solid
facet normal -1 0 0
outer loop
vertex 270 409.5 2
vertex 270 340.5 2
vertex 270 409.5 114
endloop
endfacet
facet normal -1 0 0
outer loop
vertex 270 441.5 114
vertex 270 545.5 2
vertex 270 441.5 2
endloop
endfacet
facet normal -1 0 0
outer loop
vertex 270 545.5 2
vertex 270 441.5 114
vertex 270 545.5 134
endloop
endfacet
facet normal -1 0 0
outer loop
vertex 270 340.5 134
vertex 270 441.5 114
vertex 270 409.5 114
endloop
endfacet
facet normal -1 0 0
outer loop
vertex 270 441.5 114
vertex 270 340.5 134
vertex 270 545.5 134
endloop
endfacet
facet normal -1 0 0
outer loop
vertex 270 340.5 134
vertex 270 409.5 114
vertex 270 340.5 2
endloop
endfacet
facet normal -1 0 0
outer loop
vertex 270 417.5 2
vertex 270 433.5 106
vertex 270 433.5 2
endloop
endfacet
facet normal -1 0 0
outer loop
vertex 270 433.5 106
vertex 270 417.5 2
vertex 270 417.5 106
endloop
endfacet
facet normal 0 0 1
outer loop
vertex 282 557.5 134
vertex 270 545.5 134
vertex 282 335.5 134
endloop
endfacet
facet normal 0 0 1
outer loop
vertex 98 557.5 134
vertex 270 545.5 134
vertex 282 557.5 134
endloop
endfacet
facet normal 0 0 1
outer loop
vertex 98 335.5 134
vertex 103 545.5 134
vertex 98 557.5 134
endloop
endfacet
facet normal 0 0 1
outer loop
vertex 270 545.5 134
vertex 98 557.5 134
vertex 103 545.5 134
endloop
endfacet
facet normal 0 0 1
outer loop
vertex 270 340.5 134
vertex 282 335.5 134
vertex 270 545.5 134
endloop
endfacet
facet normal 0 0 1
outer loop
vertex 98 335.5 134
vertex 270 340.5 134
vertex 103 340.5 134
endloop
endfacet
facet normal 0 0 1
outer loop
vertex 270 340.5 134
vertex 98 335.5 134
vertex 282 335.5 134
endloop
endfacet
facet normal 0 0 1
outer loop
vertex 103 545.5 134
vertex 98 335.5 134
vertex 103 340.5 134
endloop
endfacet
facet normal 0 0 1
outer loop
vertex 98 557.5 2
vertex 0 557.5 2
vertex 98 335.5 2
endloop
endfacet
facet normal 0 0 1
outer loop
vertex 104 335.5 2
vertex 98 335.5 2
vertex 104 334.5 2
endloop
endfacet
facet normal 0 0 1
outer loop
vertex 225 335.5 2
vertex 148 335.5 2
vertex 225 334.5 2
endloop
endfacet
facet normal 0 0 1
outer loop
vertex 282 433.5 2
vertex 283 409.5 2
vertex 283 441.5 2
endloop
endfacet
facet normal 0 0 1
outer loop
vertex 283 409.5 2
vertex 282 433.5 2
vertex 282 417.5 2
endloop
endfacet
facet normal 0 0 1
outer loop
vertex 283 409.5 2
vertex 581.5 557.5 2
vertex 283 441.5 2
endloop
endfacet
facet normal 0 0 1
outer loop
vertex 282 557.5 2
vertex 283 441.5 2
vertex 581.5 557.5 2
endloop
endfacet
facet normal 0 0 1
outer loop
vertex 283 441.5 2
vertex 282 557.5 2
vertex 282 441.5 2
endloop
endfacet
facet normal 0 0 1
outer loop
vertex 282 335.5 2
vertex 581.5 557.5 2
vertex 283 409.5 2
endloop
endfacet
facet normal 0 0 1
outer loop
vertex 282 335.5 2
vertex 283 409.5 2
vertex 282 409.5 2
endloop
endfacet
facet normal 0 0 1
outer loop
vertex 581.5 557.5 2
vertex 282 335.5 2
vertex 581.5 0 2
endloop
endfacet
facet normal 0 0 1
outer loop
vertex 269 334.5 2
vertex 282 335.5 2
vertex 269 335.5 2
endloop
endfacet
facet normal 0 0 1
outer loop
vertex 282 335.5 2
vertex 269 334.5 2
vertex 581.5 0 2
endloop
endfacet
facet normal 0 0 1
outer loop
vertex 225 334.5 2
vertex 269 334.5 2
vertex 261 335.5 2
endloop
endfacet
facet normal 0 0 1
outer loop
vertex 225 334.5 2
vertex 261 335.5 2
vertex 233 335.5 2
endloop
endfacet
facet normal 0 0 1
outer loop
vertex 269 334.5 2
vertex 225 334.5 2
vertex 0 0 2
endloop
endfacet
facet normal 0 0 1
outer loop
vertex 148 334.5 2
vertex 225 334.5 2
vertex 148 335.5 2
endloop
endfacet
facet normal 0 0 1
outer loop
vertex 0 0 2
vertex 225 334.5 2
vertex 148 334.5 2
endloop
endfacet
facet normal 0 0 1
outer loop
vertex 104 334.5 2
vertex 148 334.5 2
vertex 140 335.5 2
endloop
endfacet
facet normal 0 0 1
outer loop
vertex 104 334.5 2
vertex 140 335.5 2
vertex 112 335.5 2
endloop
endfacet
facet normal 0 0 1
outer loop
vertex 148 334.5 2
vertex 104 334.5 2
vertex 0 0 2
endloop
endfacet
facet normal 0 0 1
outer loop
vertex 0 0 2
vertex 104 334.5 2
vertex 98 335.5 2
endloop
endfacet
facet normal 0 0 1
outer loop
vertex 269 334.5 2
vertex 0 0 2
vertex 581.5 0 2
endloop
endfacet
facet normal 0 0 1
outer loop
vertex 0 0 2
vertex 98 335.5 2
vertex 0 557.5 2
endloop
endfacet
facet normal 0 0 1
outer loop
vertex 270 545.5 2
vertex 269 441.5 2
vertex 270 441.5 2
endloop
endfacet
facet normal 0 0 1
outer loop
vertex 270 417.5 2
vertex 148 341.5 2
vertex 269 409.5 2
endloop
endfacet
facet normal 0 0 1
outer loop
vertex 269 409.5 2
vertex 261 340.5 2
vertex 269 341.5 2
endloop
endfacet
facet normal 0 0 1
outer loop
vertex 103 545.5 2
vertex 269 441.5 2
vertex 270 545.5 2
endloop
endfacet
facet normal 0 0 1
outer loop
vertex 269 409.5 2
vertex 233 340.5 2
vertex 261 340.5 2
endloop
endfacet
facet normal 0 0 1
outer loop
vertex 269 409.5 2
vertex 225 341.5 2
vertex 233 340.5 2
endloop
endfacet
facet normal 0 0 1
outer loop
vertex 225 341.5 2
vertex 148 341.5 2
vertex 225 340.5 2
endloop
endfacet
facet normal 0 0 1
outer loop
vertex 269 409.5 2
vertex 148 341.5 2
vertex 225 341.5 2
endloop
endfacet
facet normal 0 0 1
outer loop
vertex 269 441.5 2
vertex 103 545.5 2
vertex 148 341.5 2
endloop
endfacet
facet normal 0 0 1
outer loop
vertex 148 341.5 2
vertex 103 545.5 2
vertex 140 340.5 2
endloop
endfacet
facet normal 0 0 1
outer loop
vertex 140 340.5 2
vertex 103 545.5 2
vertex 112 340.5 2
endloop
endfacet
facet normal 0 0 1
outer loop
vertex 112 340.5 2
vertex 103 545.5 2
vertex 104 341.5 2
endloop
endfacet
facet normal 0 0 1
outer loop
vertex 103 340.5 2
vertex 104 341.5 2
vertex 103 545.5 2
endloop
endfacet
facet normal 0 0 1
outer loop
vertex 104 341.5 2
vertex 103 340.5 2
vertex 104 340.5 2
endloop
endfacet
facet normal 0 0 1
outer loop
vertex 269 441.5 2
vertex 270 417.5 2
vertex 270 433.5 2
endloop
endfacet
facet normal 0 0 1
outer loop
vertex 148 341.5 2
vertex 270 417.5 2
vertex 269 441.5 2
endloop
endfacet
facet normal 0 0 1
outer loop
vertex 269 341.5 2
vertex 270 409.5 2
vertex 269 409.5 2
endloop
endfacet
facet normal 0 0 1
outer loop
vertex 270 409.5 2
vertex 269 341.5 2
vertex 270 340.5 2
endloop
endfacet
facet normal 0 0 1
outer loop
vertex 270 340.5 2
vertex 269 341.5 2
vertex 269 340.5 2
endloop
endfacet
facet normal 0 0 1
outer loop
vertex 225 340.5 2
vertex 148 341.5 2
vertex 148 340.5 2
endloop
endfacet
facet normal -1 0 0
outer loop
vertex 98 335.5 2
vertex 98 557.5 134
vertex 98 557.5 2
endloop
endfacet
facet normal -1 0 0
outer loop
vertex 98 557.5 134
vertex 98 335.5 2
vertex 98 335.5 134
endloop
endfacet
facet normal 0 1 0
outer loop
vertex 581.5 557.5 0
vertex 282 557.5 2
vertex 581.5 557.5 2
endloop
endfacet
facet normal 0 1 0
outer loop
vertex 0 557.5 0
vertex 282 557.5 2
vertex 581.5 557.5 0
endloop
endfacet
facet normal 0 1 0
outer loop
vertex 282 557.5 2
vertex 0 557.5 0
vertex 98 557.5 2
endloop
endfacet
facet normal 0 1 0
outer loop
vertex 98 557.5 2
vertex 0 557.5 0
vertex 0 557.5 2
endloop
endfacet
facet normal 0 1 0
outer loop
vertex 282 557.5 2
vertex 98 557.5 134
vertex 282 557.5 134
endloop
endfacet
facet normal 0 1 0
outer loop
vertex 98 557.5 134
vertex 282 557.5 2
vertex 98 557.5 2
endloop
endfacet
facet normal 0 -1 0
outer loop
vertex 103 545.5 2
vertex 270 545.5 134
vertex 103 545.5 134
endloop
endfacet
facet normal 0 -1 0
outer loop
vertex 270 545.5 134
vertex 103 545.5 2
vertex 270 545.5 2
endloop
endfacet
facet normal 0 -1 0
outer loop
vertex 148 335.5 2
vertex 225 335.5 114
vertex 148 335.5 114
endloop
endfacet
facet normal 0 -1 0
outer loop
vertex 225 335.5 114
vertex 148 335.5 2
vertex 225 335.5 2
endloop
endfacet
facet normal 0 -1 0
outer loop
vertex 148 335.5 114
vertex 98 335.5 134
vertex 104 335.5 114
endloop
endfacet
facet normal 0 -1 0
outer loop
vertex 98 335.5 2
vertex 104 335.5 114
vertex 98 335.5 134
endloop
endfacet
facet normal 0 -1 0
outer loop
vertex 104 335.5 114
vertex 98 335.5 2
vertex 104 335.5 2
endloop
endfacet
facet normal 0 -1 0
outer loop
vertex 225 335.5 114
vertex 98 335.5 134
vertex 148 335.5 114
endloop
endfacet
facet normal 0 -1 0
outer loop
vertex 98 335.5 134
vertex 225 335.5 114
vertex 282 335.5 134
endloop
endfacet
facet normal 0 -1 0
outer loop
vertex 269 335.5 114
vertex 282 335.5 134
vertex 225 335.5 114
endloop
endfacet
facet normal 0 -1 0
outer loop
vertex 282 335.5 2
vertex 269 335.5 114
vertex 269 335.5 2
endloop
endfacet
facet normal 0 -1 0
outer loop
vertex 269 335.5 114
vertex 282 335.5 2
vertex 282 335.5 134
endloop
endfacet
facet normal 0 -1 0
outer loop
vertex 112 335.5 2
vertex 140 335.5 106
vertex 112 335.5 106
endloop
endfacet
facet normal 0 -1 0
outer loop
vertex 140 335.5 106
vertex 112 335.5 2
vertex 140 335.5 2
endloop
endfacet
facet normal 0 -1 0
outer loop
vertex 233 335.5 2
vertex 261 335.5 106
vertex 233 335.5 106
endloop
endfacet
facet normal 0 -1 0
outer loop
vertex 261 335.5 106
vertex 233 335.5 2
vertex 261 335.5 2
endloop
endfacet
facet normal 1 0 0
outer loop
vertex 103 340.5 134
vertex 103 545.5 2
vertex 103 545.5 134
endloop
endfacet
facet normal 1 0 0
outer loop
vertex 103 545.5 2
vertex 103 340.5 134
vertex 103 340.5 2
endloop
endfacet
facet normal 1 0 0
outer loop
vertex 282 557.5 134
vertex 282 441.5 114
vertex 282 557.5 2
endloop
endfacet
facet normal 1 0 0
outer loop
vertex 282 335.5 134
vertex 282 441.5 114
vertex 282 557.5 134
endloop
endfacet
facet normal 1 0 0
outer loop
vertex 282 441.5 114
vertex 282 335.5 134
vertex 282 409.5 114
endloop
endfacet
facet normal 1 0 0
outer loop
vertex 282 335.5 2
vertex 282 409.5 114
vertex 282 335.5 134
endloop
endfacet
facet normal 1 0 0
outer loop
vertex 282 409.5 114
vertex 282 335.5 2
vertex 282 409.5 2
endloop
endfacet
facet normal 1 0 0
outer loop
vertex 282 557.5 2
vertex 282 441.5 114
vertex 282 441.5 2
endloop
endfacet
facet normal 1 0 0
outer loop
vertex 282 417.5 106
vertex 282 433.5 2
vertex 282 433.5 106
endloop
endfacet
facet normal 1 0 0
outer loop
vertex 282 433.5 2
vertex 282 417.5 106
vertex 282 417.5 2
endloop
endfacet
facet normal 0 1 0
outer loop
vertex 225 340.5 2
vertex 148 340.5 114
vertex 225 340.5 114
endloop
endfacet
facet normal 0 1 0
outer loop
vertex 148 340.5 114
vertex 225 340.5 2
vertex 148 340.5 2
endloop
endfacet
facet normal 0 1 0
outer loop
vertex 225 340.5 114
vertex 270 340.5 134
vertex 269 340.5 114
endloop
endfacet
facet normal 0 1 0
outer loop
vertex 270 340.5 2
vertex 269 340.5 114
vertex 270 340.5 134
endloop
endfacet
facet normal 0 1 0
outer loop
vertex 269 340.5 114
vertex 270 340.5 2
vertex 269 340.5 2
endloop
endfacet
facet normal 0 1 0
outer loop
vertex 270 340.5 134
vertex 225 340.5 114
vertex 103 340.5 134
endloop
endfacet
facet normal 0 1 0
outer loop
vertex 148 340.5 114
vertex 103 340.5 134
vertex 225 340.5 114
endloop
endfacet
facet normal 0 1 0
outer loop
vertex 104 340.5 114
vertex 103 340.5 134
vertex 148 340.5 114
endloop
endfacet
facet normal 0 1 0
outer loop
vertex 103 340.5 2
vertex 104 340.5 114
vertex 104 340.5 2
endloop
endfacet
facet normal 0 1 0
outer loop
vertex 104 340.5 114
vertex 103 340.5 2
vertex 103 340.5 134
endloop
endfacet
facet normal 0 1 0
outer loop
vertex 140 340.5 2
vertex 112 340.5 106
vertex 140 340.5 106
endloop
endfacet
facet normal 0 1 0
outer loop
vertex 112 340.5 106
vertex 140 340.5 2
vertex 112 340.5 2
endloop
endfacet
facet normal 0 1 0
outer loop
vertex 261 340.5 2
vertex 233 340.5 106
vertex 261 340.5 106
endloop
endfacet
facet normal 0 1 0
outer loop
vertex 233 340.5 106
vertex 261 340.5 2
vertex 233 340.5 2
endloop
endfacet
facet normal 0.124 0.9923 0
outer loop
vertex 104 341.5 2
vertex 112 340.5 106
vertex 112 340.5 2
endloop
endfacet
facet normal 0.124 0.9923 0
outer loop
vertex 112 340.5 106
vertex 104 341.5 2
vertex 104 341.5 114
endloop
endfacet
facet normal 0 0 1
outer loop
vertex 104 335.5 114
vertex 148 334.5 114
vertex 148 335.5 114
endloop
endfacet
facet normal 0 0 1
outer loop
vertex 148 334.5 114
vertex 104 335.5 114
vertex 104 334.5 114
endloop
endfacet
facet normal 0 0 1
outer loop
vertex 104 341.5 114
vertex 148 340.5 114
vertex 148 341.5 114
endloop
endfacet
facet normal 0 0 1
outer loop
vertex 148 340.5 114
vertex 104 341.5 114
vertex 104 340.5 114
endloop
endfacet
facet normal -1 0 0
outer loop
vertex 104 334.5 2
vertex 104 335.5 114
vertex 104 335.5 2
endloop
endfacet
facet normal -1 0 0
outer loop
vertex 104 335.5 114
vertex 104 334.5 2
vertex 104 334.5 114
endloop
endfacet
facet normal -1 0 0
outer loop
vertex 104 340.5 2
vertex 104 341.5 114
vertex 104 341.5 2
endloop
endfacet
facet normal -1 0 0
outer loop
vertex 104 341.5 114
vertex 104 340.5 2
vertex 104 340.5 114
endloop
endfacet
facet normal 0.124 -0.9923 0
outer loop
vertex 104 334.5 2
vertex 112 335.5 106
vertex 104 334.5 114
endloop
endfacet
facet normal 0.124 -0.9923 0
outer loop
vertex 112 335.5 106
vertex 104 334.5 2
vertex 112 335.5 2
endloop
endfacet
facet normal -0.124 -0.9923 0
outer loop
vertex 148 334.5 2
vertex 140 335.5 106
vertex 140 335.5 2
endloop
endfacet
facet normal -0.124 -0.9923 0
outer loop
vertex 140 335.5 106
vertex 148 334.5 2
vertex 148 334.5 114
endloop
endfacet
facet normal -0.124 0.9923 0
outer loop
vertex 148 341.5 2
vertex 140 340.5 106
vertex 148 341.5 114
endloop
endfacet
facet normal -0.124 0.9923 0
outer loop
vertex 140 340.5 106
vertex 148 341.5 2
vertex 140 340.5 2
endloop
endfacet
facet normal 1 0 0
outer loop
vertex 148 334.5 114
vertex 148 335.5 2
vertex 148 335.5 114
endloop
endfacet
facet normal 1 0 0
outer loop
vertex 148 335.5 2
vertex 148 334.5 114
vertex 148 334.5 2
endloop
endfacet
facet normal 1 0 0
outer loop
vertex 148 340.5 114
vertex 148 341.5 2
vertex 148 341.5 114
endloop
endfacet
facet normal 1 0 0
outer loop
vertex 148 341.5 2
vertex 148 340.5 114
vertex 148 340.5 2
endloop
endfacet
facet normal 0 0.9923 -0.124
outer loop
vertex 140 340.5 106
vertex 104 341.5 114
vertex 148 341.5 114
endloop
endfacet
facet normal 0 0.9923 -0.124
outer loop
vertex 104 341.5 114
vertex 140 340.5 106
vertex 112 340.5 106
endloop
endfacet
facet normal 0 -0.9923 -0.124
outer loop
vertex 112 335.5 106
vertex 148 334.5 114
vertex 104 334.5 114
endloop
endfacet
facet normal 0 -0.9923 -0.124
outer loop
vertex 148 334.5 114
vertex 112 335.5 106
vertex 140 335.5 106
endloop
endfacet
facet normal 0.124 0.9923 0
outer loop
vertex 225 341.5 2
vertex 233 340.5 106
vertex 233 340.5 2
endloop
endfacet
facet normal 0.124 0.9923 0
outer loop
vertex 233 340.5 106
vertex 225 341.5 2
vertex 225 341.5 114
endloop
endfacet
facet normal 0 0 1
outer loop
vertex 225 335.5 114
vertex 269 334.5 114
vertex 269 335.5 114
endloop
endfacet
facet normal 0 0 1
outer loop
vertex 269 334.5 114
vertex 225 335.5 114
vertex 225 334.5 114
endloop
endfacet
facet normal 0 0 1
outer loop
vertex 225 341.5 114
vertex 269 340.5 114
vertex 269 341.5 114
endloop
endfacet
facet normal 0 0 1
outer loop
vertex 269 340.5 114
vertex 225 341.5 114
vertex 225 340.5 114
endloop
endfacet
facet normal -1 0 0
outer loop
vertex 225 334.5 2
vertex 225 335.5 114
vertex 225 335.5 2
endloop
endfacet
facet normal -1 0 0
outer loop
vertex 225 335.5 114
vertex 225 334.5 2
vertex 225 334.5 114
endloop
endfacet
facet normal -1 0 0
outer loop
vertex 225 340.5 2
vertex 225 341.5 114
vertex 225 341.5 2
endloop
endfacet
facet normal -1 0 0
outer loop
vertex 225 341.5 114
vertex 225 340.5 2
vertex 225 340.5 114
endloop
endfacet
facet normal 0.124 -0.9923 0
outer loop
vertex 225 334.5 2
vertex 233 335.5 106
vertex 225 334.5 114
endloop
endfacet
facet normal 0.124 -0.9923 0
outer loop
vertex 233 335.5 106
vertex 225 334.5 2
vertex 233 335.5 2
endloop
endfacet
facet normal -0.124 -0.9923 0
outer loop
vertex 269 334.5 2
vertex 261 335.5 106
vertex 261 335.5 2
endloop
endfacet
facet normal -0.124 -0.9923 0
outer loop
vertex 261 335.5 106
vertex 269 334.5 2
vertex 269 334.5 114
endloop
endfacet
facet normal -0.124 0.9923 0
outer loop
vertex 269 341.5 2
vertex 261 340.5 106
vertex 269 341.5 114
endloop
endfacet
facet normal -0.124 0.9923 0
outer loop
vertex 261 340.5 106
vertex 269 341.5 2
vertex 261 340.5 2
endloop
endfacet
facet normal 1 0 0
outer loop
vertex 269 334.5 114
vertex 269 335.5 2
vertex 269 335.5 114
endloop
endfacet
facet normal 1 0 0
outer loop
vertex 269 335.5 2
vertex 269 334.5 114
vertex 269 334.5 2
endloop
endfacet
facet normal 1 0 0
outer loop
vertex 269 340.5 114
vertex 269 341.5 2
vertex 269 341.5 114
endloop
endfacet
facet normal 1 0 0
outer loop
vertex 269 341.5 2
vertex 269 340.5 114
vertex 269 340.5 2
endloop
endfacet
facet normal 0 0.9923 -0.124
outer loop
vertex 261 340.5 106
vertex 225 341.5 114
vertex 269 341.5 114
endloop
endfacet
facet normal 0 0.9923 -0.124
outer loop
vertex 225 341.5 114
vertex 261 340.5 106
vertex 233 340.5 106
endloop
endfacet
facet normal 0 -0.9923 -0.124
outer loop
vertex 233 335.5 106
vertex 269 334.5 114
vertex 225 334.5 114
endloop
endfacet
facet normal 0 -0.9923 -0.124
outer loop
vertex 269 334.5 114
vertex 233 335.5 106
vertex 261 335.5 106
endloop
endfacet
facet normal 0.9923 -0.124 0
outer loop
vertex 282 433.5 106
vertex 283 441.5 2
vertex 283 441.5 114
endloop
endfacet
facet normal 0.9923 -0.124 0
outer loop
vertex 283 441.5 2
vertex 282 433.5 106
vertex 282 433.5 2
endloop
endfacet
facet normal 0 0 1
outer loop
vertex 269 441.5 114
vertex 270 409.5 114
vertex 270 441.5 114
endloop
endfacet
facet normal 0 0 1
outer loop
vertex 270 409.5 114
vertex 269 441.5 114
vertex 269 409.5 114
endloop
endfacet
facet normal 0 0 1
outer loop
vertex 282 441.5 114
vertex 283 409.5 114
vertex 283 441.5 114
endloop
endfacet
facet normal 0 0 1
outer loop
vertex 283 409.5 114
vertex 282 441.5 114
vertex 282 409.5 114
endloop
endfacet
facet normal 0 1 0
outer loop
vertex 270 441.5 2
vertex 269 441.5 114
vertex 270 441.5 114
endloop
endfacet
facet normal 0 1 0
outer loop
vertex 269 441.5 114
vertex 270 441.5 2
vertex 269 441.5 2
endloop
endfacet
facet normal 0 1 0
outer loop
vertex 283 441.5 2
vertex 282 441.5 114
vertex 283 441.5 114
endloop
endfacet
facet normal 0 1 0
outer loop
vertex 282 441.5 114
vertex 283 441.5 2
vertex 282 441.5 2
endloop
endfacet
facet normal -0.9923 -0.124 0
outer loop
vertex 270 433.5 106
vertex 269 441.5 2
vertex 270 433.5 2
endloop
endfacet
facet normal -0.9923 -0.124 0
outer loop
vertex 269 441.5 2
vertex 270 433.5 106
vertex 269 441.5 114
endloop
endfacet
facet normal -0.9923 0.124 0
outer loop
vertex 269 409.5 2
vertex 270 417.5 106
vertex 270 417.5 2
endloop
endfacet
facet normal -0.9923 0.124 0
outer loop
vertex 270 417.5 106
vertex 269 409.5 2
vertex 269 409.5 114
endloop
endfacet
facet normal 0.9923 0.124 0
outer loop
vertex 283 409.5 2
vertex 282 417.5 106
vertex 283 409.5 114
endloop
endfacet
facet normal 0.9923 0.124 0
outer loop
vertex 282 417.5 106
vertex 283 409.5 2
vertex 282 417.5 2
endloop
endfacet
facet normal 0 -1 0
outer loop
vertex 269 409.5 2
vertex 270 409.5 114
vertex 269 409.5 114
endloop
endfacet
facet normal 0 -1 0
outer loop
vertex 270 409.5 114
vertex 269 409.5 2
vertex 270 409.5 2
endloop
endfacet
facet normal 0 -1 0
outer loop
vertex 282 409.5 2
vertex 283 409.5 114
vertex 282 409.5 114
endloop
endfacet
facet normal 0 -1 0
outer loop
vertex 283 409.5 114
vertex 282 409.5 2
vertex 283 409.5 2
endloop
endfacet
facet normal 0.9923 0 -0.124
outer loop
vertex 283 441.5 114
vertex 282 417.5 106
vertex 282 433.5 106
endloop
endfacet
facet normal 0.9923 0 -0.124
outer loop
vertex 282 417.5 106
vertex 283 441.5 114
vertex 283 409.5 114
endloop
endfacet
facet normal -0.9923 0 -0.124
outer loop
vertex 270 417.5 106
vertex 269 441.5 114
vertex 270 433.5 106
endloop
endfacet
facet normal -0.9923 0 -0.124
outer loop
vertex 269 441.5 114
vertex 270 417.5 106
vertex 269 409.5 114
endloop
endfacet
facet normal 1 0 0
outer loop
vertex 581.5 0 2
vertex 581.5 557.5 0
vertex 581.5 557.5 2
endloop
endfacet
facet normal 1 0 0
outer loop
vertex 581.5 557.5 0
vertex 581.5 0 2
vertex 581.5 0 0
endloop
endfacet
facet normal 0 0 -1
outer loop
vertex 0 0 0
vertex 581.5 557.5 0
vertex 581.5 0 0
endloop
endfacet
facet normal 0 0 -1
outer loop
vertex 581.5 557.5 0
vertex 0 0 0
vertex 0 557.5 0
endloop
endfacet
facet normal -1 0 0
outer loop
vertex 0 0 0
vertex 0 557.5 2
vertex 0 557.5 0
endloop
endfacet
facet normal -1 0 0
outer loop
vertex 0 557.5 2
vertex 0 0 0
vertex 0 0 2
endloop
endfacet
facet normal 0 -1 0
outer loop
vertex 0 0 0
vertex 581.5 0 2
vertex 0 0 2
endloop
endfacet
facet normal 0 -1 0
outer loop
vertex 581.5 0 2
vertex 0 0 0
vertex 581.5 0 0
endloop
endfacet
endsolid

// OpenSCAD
$fn=50;

thin_wall = 5;
thick_wall = 12;
floor_thickness = 2;
wall_height = 12*11;

frame_x_length = 
    thin_wall + 4.5 + (12*7+4.5) + //hallway
    thin_wall + (12*13+11) + //living room
    thick_wall + (12*4+10.5) + //bath
    thin_wall + (12+9) + //master room closet
    thin_wall + (12*16+6) + thick_wall; //master bedroom
    
frame_y_length = 
    thick_wall + (12*16+6) + //living room
    thin_wall + (12*5) + (12*3+4) + (12*3+1) + (12*8+7) + // halllway
    thick_wall + (12*7+1.5) + thin_wall;//netta room

module base_frame() {
    color("gray") cube([
        frame_x_length,
        frame_y_length,
        floor_thickness
    ]);
}

molding_none = 0;
molding_in = 1;
molding_out = 2;
molding_in_out = 3;

module molding(length) {
    rotate([0, 90, 0]) linear_extrude(height = length) {
        radius = 1;
        polygon(points=[
            [0, 0],
            [-radius, 0],
            for (i = [91:180]) [radius*cos(i), radius*sin(i)],
            [0, radius]
        ]);
    }
}

module wall(angle, thickness, length, molding) {
    rotate([0, 0, angle]) {
        cube([length, thickness, wall_height]);
    
        do_molding_in = molding == molding_in || molding == molding_in_out;
        do_molding_out = molding == molding_out || molding == molding_in_out;
        
        molding_height = 4;
        
        if (do_molding_in) {
            translate([0,thickness,0]) molding(length);
        }
    }
}

module entrance_single_frame(thickness, height, frame_width) {
    outer_thickness_delta = 1;
    
    linear_extrude(height = height)
        polygon(points=[
            [-frame_width, outer_thickness_delta],
            [-frame_width,-thickness-outer_thickness_delta],
            [frame_width, -thickness],
            [frame_width, 0]
        ]);
}

module enterance_frame(angle, thickness, height, width) {
    frame_width = 4;
    rotate([0, 0, angle]) {
        entrance_single_frame(thickness, height+frame_width, frame_width);
        translate([width, 0, 0]) mirror([1,0,0]) entrance_single_frame(thickness, height+frame_width, frame_width);
        translate([-frame_width, 0, height]) rotate([0, 90, 0]) entrance_single_frame(thickness, width+2*frame_width, frame_width);
    }
}

module living_room() {
    translate([
        thin_wall + 4.5 + (12*7+4.5),//hallway
        frame_y_length - thick_wall,
        0
    ]) {
        // walls
        west_wall = thin_wall + (12*13+11);
        south_wall = thick_wall + (12*16+6);
        wall(0, thick_wall, west_wall, molding_in);
        wall(-90, thin_wall, south_wall, molding_in);
        translate([west_wall, thick_wall, 0]) wall(-90, thick_wall, south_wall + thick_wall, molding_in_out);
        translate([0, -south_wall, 0]) wall(0, thin_wall, west_wall, molding_in);
        
        //south entrance
        translate([5+thin_wall, -south_wall+thin_wall, 0]) enterance_frame(0, thin_wall, 12*9, 12*3);
        //south-north entrance
        translate([west_wall-5-12*3, -south_wall+thin_wall, 0]) enterance_frame(0, thin_wall, 12*9, 12*3);
        //north entrance
        translate([west_wall + thick_wall, -12*9, 0]) enterance_frame(-90, thick_wall, 12*9, 12*2);
    }
}

base_frame();

translate([0, 0, floor_thickness]) {
    living_room();
}
